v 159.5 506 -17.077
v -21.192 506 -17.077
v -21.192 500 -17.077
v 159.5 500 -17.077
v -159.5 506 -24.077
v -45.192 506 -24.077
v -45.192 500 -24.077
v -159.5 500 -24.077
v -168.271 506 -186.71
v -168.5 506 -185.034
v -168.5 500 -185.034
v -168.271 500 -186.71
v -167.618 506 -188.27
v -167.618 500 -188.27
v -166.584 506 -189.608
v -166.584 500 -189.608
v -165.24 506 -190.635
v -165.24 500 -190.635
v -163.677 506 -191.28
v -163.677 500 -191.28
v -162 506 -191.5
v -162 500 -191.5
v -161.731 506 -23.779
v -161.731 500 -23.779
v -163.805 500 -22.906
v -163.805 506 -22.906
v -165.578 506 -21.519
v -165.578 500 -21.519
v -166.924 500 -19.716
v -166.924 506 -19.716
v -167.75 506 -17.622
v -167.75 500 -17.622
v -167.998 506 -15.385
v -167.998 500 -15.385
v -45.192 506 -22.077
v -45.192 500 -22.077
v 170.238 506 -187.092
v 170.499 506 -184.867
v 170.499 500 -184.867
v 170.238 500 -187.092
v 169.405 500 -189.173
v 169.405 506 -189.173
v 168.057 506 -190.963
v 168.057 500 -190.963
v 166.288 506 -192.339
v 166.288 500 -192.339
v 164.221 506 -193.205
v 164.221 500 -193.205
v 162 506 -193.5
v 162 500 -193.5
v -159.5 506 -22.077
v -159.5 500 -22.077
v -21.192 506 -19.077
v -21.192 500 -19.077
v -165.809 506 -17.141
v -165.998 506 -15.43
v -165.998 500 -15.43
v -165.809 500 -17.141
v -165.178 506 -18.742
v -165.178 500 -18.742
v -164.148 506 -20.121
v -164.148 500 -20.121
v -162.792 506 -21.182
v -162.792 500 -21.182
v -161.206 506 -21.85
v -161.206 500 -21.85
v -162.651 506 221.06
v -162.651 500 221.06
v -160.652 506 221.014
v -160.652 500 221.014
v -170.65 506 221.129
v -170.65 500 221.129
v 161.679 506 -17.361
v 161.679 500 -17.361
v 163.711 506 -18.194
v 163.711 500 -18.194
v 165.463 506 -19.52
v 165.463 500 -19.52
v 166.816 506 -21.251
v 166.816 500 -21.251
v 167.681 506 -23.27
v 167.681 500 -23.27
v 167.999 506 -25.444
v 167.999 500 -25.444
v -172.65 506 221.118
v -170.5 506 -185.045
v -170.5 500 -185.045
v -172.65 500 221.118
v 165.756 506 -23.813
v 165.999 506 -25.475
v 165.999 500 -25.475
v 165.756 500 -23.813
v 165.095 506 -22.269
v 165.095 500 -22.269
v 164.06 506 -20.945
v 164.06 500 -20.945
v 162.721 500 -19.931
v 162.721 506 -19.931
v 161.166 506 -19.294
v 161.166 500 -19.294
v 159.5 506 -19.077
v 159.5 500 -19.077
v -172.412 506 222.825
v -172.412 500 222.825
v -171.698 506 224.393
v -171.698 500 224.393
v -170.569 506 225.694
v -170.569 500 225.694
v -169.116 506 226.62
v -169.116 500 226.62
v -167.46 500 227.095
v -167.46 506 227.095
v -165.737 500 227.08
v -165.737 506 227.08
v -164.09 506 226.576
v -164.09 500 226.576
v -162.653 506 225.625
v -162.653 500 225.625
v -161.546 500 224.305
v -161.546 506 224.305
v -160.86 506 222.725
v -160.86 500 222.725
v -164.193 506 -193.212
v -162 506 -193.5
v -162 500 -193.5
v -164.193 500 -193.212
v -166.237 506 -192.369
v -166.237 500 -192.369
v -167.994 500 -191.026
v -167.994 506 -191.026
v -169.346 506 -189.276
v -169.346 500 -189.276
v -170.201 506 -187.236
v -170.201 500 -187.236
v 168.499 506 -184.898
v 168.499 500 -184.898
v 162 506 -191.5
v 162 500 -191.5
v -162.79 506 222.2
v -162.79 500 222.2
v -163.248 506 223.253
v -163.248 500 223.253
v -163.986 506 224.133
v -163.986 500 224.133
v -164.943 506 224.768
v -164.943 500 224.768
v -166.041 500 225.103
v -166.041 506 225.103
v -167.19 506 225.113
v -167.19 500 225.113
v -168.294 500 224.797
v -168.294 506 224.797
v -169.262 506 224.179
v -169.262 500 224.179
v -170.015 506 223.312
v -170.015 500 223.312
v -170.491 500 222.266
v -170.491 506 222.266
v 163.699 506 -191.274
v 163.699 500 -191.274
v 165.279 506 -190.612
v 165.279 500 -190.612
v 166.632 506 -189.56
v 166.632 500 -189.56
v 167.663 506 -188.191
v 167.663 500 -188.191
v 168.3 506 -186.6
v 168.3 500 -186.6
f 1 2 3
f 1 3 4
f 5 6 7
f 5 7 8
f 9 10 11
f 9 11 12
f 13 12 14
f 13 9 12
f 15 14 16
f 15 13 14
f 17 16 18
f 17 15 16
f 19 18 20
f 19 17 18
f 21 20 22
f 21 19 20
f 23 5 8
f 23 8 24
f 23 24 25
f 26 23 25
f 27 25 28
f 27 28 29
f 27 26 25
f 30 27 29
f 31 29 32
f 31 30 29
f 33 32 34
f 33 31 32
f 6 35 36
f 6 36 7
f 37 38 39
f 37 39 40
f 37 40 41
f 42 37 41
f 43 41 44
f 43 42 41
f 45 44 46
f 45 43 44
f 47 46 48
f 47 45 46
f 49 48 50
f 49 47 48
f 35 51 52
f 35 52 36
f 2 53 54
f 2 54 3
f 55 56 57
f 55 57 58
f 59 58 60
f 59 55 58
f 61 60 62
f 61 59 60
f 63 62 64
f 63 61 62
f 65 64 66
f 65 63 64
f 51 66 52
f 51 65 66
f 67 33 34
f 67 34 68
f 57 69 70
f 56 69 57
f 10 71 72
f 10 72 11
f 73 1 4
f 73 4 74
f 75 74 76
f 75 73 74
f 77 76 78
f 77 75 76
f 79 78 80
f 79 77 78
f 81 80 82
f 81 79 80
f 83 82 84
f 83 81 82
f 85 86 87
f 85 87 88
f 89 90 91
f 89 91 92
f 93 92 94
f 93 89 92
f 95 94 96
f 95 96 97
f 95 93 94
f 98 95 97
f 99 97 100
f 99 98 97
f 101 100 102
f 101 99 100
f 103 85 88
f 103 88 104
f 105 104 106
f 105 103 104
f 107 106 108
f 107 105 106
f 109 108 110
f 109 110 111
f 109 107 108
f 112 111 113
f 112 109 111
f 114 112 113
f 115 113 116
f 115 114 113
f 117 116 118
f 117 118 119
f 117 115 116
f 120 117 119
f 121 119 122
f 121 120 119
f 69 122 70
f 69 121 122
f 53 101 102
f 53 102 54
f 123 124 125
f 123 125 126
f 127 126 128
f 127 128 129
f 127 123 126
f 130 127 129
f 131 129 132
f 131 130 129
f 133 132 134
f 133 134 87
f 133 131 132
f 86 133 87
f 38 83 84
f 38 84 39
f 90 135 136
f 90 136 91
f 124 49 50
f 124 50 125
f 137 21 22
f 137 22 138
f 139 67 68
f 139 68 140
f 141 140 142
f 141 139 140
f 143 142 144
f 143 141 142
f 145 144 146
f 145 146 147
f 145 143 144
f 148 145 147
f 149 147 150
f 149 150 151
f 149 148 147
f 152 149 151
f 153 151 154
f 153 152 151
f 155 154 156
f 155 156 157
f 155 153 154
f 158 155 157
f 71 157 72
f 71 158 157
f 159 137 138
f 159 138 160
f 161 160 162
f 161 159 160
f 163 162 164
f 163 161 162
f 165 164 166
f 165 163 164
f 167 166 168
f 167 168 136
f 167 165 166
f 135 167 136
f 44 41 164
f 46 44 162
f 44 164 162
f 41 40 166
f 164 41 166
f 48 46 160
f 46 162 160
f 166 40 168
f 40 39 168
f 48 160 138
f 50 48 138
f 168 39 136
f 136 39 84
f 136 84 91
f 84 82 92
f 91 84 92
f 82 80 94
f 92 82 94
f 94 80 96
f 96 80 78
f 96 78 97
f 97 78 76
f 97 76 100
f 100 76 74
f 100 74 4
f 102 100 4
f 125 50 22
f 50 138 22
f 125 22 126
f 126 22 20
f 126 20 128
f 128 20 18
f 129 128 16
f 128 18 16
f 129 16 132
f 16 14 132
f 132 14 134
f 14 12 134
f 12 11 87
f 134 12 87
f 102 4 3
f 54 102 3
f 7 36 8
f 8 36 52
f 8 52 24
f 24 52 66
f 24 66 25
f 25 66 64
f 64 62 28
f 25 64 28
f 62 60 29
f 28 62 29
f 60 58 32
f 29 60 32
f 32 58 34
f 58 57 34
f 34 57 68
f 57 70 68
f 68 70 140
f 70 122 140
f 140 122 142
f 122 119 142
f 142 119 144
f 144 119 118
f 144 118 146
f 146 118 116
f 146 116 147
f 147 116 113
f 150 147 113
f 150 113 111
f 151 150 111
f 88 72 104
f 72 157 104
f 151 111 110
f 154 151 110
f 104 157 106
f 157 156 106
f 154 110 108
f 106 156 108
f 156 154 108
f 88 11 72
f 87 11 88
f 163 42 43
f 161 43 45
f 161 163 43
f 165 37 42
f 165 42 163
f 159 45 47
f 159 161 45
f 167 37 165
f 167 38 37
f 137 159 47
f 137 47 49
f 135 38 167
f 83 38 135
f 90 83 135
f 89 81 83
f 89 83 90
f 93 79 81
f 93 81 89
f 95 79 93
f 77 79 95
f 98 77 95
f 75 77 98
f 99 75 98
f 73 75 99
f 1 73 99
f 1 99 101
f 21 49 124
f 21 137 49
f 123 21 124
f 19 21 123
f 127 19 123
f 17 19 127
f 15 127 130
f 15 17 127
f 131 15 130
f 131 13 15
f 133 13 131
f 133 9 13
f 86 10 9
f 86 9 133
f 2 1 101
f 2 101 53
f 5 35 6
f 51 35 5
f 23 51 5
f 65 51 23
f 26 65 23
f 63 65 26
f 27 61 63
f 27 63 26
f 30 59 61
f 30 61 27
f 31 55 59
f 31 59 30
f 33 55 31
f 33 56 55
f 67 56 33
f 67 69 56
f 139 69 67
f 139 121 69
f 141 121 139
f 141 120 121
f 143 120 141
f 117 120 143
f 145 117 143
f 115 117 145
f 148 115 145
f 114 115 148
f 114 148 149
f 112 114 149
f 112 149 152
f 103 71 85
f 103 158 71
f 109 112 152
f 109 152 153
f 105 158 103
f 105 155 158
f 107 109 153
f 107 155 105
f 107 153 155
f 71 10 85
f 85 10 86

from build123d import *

# Parameters (mm, degrees)
EXTRUDE_THIN1_DEPTH = 6


with BuildPart() as part:
    # Sketch1 → Extrude-Thin1 (new body)
    with BuildSketch(Plane.XZ.offset(-506)):
        with BuildLine():
            Line((-21.192485275, -17.077366054), (159.500009042, -17.077366054))
            ThreePointArc((159.500009042, -17.077366054), (165.46311011, -19.520021284), (167.998964116, -25.444089427))
            Line((167.998964116, -25.444089427), (170.498955066, -184.866722883))
            ThreePointArc((170.498955066, -184.866722883), (168.057344942, -190.963100892), (162, -193.5))
            Line((162, -193.5), (-162, -193.5))
            ThreePointArc((-162, -193.5), (-167.994478635, -191.026294541), (-170.499880912, -185.044994328))
            Line((-170.499880912, -185.044994328), (-172.649915938, 221.118239298))
            ThreePointArc((-172.649915938, 221.118239298), (-166.598052627, 227.149775118), (-160.651533501, 221.014354663))
            Line((-160.651533501, 221.014354663), (-165.998338708, -15.430425982))
            ThreePointArc((-165.998338708, -15.430425982), (-164.147858351, -20.121318086), (-159.5, -22.077375097))
            Line((-159.5, -22.077375097), (-45.192485275, -22.077375097))
            Line((-45.192485275, -22.077375097), (-45.192485275, -24.077375097))
            Line((-45.192485275, -24.077375097), (-159.499998361, -24.077375097))
            ThreePointArc((-159.499998361, -24.077375097), (-165.577967625, -21.519455227), (-167.997827562, -15.385211808))
            Line((-167.997827562, -15.385211808), (-162.651022334, 221.059569775))
            ThreePointArc((-162.651022334, 221.059569775), (-166.615368418, 225.149850079), (-170.649943958, 221.128826199))
            Line((-170.649943958, 221.128826199), (-168.499908932, -185.034407427))
            ThreePointArc((-168.499908932, -185.034407427), (-166.584013074, -189.608342884), (-162, -191.5))
            Line((-162, -191.5), (162, -191.5))
            ThreePointArc((162, -191.5), (166.632088112, -189.560017513), (168.499200897, -184.898079914))
            Line((168.499200897, -184.898079914), (165.999209981, -25.475448634))
            ThreePointArc((165.999209981, -25.475448634), (164.060027506, -20.945278877), (159.500009042, -19.077366054))
            Line((159.500009042, -19.077366054), (-21.192485275, -19.077366054))
            Line((-21.192485275, -19.077366054), (-21.192485275, -17.077366054))
        make_face()
    extrude(amount=EXTRUDE_THIN1_DEPTH)


solid = part.part
